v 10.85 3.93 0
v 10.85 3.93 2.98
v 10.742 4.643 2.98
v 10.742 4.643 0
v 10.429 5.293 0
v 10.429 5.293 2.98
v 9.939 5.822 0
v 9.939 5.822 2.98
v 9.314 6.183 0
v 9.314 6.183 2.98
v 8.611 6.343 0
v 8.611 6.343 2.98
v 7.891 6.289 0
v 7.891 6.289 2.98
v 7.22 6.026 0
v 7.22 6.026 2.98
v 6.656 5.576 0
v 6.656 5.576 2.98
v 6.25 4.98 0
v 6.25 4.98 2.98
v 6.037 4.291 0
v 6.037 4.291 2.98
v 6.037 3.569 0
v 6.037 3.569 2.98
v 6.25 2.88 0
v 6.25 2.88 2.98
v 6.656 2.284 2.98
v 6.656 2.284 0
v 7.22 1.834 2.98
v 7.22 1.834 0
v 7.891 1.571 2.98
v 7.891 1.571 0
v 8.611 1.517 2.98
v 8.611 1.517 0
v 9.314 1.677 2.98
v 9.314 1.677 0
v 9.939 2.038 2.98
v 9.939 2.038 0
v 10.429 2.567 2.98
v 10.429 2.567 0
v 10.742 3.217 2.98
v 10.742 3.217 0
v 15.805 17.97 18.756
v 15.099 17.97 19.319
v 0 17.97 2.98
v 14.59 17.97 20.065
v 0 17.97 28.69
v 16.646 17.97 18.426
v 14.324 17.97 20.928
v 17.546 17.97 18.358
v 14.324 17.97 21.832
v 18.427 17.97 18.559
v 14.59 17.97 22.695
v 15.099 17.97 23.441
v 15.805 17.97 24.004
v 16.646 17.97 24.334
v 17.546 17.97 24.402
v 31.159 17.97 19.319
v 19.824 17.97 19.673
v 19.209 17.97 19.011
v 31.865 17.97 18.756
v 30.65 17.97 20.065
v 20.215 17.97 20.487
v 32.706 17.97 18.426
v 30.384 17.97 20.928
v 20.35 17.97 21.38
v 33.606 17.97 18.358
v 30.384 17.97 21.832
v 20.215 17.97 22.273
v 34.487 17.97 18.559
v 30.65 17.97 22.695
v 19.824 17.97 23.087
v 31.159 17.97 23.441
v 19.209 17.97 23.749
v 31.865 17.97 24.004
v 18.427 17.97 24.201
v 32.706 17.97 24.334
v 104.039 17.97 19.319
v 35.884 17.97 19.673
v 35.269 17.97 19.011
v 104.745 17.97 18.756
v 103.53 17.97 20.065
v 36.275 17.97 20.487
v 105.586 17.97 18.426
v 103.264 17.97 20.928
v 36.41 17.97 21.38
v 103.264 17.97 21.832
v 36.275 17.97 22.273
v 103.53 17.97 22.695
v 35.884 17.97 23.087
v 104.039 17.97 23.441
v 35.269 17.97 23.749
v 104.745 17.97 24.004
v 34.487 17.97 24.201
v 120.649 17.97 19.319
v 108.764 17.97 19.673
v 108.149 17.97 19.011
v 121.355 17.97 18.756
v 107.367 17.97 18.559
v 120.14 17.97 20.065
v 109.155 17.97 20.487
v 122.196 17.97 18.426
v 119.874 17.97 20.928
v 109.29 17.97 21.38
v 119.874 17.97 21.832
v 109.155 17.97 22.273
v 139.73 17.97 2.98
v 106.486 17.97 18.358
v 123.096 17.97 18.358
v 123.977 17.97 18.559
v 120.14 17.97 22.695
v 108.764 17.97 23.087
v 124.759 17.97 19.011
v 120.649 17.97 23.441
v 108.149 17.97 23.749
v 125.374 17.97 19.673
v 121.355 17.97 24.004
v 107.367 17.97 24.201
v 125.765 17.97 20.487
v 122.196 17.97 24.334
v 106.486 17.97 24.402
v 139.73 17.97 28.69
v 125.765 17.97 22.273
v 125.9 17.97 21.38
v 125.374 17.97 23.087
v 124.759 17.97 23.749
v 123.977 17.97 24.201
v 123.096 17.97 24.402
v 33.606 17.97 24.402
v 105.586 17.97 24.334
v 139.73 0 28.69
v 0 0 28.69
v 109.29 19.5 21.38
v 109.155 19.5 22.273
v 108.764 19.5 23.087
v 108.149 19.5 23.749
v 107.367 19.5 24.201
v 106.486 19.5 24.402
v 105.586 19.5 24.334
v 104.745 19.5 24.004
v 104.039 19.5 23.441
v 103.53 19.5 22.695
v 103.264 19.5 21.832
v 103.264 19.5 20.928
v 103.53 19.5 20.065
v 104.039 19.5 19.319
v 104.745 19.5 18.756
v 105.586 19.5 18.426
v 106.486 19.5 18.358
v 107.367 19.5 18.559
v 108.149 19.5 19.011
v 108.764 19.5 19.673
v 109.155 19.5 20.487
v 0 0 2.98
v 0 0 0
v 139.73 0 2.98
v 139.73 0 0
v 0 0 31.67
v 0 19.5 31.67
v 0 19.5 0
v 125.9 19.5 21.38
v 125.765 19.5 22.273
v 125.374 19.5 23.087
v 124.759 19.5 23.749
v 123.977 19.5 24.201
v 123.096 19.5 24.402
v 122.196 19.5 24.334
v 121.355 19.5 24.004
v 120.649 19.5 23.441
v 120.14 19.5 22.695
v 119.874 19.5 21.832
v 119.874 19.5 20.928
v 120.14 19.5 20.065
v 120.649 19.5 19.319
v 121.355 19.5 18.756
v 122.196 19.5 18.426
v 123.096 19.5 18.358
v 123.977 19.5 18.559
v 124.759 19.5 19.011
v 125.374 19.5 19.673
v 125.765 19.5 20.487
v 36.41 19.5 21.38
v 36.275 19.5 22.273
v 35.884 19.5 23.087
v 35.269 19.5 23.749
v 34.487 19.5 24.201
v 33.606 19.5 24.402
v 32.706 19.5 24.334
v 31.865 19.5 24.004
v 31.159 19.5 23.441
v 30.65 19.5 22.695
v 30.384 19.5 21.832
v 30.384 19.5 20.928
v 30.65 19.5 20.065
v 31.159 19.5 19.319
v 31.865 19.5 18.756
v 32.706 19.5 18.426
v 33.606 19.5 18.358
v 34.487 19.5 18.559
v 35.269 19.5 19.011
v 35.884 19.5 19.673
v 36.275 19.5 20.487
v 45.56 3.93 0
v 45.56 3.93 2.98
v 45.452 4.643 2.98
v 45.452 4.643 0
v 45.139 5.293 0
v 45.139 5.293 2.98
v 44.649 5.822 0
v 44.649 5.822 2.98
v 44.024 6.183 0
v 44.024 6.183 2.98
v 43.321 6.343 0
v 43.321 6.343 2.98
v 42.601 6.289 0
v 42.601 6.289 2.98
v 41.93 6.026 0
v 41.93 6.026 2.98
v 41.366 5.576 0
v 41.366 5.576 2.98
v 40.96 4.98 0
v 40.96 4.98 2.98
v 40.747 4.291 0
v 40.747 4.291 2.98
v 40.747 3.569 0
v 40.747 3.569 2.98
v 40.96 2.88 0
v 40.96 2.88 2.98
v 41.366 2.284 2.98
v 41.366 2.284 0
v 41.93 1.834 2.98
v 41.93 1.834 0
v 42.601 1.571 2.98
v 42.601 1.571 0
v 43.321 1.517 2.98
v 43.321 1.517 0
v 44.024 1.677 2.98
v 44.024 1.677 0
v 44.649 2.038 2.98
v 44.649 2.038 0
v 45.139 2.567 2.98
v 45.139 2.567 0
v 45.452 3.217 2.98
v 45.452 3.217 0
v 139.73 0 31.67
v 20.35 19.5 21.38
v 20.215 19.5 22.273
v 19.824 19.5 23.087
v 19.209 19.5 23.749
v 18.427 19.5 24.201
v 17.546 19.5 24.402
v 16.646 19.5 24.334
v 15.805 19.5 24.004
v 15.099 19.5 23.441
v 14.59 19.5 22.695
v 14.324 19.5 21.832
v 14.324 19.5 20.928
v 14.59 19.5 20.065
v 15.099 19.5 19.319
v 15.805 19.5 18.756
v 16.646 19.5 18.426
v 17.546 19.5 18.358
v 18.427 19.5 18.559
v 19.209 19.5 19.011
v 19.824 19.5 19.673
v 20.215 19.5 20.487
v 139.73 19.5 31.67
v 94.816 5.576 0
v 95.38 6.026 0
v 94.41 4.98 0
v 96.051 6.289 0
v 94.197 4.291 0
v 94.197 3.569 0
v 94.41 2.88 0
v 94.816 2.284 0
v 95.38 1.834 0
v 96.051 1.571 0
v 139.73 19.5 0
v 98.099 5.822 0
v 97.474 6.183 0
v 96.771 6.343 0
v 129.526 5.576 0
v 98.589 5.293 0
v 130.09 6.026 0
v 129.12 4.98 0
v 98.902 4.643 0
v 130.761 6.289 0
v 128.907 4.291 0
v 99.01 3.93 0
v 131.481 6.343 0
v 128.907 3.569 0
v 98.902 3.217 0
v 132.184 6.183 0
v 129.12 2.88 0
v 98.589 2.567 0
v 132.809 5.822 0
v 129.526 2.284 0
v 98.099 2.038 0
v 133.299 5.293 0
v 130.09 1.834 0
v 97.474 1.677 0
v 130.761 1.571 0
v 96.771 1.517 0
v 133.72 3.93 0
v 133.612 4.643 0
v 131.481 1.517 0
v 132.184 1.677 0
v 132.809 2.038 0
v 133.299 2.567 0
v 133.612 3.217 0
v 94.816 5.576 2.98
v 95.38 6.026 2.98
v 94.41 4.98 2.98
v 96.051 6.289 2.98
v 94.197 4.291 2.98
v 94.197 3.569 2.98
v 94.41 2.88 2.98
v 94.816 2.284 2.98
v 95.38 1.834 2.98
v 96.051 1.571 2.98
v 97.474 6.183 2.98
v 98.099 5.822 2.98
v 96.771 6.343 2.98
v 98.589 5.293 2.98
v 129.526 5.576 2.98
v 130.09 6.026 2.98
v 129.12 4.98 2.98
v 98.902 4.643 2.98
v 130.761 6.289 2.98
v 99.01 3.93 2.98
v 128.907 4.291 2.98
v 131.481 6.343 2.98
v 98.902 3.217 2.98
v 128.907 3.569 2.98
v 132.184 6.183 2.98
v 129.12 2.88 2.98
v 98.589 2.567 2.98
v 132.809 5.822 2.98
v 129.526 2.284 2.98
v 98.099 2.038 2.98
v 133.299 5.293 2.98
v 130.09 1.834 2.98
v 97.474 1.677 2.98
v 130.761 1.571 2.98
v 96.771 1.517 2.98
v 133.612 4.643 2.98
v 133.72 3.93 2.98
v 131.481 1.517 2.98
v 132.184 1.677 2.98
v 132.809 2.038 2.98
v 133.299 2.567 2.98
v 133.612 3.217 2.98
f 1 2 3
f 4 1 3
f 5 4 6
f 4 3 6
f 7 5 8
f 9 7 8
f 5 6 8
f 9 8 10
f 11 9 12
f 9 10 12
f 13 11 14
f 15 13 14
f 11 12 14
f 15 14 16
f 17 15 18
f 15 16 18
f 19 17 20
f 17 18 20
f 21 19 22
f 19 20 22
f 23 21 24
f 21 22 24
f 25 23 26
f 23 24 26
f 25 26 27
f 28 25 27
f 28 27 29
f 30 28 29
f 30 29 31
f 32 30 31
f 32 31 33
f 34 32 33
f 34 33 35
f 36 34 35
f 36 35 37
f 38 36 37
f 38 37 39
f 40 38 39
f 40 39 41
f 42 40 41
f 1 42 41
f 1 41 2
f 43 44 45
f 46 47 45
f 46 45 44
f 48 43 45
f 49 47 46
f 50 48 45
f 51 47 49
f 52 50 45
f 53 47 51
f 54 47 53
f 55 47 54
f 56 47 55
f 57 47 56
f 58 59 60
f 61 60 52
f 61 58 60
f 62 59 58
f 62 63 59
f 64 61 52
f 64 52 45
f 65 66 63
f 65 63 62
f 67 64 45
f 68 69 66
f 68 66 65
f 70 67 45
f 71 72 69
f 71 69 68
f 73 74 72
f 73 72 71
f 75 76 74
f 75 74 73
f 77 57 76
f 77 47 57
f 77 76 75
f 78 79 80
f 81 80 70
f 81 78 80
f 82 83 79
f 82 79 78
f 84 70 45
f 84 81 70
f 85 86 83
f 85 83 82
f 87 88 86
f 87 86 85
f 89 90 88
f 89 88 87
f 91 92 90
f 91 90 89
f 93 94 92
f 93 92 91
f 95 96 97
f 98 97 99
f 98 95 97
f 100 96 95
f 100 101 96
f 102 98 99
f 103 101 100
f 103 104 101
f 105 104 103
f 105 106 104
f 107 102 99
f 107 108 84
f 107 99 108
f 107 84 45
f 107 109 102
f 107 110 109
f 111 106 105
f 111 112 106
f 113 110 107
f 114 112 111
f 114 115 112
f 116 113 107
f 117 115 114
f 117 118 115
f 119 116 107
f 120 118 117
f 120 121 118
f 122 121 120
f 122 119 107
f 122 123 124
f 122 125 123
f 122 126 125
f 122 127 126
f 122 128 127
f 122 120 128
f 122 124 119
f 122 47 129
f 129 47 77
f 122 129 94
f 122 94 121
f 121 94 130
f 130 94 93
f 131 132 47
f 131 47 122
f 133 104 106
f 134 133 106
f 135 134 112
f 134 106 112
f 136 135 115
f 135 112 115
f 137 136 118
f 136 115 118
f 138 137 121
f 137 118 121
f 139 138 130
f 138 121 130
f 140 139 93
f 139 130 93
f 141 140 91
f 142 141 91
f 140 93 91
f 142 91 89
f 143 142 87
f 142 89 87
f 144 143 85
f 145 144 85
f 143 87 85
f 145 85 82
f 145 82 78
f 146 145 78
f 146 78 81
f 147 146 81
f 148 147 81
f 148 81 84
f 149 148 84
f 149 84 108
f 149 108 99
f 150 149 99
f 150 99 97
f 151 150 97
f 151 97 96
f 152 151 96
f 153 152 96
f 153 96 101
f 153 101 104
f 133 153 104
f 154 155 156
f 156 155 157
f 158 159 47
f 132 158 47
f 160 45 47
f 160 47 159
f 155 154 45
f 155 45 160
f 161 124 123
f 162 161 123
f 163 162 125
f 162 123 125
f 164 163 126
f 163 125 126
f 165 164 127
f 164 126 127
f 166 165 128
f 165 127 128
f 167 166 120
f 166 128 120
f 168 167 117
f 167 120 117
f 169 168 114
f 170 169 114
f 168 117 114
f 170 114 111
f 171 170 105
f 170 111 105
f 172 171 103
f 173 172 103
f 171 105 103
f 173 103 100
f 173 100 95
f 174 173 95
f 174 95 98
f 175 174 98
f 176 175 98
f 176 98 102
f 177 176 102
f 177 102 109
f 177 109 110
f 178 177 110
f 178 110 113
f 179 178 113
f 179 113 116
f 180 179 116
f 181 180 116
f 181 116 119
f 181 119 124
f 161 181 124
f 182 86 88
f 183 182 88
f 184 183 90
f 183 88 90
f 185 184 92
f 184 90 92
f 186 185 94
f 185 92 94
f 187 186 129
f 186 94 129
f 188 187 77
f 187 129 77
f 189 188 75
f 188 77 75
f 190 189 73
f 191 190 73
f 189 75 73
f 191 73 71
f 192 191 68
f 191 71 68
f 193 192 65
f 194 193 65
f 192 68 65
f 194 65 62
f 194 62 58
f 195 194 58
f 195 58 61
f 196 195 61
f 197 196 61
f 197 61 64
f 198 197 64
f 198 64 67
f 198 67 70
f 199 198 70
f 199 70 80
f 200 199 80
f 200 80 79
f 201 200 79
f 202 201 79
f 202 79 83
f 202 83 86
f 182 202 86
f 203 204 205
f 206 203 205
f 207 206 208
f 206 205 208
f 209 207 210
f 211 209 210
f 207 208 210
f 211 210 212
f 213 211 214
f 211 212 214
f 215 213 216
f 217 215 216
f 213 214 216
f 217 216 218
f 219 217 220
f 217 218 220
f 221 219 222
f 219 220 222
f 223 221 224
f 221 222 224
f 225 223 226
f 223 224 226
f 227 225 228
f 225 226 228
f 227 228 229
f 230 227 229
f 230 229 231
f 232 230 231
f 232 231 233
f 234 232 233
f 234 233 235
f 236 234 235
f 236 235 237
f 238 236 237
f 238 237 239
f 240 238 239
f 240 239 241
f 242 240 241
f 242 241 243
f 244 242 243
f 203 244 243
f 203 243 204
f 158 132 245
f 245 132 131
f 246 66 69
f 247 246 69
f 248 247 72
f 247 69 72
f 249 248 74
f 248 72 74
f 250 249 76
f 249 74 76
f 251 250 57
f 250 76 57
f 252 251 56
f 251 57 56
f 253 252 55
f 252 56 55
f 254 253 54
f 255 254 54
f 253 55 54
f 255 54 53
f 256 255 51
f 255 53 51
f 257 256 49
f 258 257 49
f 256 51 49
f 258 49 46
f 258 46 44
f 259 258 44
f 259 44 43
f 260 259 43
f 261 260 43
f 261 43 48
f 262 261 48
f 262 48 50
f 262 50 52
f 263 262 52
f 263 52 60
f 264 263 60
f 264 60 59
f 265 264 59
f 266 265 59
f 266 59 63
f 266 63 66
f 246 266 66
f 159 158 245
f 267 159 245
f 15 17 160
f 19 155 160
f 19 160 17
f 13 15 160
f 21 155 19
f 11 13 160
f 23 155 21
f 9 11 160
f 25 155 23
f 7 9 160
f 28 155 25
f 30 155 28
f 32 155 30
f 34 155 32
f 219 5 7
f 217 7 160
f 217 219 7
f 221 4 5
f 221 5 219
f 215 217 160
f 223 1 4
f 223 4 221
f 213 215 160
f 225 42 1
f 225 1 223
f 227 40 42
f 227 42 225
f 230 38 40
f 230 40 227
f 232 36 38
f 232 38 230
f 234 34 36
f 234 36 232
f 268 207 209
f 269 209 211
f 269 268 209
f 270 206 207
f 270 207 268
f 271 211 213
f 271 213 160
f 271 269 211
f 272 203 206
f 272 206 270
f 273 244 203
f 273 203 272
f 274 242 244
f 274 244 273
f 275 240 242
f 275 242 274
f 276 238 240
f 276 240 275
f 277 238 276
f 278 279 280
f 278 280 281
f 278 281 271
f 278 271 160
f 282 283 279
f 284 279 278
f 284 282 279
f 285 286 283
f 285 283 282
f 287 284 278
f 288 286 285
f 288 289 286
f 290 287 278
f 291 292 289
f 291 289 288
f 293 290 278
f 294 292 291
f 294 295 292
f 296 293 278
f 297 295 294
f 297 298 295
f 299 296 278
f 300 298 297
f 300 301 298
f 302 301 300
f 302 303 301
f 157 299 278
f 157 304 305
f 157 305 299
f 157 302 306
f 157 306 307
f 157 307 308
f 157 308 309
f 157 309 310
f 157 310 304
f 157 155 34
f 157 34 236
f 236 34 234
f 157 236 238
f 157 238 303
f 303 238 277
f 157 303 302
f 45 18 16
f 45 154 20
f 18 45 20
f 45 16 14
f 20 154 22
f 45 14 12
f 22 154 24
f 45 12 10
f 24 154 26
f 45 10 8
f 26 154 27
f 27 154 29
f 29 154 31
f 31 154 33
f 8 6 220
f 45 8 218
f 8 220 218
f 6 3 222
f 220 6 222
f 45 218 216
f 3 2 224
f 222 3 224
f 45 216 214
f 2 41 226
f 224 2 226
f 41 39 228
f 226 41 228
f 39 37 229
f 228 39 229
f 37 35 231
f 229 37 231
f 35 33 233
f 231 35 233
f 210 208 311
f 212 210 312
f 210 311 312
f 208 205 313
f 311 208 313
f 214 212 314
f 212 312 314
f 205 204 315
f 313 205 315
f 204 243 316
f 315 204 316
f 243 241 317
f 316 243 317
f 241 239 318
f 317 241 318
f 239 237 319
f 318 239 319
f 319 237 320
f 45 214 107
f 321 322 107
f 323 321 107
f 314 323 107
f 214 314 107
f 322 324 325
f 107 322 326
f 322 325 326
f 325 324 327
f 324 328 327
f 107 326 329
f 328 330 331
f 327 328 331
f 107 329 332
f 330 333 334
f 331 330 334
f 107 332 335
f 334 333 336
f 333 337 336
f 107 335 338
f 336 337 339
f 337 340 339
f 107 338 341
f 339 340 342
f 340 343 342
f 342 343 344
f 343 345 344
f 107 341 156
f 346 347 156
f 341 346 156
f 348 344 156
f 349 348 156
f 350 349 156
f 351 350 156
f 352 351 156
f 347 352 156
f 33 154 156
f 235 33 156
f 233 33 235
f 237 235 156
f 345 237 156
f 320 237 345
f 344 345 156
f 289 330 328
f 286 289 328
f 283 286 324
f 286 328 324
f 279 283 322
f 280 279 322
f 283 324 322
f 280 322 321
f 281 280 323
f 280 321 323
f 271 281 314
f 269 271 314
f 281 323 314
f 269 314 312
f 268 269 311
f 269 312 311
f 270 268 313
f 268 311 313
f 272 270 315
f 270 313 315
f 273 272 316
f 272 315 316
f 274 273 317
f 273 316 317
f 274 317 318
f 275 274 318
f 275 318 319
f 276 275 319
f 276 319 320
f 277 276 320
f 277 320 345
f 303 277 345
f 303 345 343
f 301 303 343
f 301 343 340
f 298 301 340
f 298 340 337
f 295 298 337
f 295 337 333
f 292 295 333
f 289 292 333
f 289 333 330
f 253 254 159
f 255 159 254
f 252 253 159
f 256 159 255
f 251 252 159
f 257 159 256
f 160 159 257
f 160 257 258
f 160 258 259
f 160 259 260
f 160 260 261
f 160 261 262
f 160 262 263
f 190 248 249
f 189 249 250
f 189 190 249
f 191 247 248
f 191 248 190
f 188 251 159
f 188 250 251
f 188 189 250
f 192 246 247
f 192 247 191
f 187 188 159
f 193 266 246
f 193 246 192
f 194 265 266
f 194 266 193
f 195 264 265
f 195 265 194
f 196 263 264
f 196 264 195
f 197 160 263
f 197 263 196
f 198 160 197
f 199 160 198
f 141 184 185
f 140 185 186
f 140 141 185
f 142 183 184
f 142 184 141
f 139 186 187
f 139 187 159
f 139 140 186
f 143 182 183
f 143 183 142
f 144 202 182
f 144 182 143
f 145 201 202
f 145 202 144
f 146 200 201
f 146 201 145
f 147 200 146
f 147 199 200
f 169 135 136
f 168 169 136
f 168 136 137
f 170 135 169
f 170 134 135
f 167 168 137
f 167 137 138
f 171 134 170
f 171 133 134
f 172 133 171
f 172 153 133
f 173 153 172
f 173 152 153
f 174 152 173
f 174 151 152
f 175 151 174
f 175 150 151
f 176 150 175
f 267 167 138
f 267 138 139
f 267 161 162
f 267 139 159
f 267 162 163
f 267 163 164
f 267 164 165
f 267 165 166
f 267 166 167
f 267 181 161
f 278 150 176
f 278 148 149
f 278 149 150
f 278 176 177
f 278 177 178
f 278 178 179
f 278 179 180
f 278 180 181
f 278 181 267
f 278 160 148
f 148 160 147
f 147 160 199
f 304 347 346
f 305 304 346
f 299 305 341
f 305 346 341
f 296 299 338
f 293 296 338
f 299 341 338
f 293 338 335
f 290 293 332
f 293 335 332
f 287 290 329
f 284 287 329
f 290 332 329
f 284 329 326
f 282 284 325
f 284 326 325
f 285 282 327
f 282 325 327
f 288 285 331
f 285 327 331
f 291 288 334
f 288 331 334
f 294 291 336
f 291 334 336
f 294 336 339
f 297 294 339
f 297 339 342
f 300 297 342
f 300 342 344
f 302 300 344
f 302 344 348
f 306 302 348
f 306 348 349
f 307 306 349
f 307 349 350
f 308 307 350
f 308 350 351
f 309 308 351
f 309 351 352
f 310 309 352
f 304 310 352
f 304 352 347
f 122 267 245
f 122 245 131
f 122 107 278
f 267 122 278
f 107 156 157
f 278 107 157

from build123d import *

# Parameters (mm, degrees)
SKETCH1_W           = 139.73
SKETCH1_H           = 31.67
BOSS_EXTRUDE1_DEPTH = 19.5
SKETCH2_W           = 139.73
SKETCH2_H           = 25.71
CUT_EXTRUDE1_DEPTH  = 17.97
HOLE1_D             = 4.84
HOLE1_DEPTH         = 2.98
HOLE2_D             = 6.06
HOLE2_DEPTH         = 1.53


with BuildPart() as part:
    # Sketch1 → Boss-Extrude1 (new body)
    with BuildSketch(Plane(origin=(0, 0, 0), x_dir=(1, 0, 0), z_dir=(0, 1, 0))):
        with Locations((69.865, -15.835)):
            Rectangle(SKETCH1_W, SKETCH1_H)
    extrude(amount=BOSS_EXTRUDE1_DEPTH)

    # Sketch2 → Cut-Extrude1 (cut)
    with BuildSketch(Plane.XZ):
        with Locations((69.865, 15.835)):
            Rectangle(SKETCH2_W, SKETCH2_H)
    extrude(amount=-CUT_EXTRUDE1_DEPTH, mode=Mode.SUBTRACT)

    # Hole1
    with Locations(Plane(origin=(0, 0, 0), x_dir=(-1, 0, 0), z_dir=(0, 0, -1))):
        with Locations((-131.3, 3.93), (-96.59, 3.93), (-43.14, 3.93), (-8.43, 3.93)):
            Hole(HOLE1_D / 2, depth=HOLE1_DEPTH)

    # Hole2
    with Locations(Plane(origin=(0, 19.5, 0), x_dir=(-1, 0, 0), z_dir=(0, 1, 0))):
        with Locations((-122.87, 21.38), (-106.26, 21.38), (-33.38, 21.38), (-17.32, 21.38)):
            Hole(HOLE2_D / 2, depth=HOLE2_DEPTH)


solid = part.part
